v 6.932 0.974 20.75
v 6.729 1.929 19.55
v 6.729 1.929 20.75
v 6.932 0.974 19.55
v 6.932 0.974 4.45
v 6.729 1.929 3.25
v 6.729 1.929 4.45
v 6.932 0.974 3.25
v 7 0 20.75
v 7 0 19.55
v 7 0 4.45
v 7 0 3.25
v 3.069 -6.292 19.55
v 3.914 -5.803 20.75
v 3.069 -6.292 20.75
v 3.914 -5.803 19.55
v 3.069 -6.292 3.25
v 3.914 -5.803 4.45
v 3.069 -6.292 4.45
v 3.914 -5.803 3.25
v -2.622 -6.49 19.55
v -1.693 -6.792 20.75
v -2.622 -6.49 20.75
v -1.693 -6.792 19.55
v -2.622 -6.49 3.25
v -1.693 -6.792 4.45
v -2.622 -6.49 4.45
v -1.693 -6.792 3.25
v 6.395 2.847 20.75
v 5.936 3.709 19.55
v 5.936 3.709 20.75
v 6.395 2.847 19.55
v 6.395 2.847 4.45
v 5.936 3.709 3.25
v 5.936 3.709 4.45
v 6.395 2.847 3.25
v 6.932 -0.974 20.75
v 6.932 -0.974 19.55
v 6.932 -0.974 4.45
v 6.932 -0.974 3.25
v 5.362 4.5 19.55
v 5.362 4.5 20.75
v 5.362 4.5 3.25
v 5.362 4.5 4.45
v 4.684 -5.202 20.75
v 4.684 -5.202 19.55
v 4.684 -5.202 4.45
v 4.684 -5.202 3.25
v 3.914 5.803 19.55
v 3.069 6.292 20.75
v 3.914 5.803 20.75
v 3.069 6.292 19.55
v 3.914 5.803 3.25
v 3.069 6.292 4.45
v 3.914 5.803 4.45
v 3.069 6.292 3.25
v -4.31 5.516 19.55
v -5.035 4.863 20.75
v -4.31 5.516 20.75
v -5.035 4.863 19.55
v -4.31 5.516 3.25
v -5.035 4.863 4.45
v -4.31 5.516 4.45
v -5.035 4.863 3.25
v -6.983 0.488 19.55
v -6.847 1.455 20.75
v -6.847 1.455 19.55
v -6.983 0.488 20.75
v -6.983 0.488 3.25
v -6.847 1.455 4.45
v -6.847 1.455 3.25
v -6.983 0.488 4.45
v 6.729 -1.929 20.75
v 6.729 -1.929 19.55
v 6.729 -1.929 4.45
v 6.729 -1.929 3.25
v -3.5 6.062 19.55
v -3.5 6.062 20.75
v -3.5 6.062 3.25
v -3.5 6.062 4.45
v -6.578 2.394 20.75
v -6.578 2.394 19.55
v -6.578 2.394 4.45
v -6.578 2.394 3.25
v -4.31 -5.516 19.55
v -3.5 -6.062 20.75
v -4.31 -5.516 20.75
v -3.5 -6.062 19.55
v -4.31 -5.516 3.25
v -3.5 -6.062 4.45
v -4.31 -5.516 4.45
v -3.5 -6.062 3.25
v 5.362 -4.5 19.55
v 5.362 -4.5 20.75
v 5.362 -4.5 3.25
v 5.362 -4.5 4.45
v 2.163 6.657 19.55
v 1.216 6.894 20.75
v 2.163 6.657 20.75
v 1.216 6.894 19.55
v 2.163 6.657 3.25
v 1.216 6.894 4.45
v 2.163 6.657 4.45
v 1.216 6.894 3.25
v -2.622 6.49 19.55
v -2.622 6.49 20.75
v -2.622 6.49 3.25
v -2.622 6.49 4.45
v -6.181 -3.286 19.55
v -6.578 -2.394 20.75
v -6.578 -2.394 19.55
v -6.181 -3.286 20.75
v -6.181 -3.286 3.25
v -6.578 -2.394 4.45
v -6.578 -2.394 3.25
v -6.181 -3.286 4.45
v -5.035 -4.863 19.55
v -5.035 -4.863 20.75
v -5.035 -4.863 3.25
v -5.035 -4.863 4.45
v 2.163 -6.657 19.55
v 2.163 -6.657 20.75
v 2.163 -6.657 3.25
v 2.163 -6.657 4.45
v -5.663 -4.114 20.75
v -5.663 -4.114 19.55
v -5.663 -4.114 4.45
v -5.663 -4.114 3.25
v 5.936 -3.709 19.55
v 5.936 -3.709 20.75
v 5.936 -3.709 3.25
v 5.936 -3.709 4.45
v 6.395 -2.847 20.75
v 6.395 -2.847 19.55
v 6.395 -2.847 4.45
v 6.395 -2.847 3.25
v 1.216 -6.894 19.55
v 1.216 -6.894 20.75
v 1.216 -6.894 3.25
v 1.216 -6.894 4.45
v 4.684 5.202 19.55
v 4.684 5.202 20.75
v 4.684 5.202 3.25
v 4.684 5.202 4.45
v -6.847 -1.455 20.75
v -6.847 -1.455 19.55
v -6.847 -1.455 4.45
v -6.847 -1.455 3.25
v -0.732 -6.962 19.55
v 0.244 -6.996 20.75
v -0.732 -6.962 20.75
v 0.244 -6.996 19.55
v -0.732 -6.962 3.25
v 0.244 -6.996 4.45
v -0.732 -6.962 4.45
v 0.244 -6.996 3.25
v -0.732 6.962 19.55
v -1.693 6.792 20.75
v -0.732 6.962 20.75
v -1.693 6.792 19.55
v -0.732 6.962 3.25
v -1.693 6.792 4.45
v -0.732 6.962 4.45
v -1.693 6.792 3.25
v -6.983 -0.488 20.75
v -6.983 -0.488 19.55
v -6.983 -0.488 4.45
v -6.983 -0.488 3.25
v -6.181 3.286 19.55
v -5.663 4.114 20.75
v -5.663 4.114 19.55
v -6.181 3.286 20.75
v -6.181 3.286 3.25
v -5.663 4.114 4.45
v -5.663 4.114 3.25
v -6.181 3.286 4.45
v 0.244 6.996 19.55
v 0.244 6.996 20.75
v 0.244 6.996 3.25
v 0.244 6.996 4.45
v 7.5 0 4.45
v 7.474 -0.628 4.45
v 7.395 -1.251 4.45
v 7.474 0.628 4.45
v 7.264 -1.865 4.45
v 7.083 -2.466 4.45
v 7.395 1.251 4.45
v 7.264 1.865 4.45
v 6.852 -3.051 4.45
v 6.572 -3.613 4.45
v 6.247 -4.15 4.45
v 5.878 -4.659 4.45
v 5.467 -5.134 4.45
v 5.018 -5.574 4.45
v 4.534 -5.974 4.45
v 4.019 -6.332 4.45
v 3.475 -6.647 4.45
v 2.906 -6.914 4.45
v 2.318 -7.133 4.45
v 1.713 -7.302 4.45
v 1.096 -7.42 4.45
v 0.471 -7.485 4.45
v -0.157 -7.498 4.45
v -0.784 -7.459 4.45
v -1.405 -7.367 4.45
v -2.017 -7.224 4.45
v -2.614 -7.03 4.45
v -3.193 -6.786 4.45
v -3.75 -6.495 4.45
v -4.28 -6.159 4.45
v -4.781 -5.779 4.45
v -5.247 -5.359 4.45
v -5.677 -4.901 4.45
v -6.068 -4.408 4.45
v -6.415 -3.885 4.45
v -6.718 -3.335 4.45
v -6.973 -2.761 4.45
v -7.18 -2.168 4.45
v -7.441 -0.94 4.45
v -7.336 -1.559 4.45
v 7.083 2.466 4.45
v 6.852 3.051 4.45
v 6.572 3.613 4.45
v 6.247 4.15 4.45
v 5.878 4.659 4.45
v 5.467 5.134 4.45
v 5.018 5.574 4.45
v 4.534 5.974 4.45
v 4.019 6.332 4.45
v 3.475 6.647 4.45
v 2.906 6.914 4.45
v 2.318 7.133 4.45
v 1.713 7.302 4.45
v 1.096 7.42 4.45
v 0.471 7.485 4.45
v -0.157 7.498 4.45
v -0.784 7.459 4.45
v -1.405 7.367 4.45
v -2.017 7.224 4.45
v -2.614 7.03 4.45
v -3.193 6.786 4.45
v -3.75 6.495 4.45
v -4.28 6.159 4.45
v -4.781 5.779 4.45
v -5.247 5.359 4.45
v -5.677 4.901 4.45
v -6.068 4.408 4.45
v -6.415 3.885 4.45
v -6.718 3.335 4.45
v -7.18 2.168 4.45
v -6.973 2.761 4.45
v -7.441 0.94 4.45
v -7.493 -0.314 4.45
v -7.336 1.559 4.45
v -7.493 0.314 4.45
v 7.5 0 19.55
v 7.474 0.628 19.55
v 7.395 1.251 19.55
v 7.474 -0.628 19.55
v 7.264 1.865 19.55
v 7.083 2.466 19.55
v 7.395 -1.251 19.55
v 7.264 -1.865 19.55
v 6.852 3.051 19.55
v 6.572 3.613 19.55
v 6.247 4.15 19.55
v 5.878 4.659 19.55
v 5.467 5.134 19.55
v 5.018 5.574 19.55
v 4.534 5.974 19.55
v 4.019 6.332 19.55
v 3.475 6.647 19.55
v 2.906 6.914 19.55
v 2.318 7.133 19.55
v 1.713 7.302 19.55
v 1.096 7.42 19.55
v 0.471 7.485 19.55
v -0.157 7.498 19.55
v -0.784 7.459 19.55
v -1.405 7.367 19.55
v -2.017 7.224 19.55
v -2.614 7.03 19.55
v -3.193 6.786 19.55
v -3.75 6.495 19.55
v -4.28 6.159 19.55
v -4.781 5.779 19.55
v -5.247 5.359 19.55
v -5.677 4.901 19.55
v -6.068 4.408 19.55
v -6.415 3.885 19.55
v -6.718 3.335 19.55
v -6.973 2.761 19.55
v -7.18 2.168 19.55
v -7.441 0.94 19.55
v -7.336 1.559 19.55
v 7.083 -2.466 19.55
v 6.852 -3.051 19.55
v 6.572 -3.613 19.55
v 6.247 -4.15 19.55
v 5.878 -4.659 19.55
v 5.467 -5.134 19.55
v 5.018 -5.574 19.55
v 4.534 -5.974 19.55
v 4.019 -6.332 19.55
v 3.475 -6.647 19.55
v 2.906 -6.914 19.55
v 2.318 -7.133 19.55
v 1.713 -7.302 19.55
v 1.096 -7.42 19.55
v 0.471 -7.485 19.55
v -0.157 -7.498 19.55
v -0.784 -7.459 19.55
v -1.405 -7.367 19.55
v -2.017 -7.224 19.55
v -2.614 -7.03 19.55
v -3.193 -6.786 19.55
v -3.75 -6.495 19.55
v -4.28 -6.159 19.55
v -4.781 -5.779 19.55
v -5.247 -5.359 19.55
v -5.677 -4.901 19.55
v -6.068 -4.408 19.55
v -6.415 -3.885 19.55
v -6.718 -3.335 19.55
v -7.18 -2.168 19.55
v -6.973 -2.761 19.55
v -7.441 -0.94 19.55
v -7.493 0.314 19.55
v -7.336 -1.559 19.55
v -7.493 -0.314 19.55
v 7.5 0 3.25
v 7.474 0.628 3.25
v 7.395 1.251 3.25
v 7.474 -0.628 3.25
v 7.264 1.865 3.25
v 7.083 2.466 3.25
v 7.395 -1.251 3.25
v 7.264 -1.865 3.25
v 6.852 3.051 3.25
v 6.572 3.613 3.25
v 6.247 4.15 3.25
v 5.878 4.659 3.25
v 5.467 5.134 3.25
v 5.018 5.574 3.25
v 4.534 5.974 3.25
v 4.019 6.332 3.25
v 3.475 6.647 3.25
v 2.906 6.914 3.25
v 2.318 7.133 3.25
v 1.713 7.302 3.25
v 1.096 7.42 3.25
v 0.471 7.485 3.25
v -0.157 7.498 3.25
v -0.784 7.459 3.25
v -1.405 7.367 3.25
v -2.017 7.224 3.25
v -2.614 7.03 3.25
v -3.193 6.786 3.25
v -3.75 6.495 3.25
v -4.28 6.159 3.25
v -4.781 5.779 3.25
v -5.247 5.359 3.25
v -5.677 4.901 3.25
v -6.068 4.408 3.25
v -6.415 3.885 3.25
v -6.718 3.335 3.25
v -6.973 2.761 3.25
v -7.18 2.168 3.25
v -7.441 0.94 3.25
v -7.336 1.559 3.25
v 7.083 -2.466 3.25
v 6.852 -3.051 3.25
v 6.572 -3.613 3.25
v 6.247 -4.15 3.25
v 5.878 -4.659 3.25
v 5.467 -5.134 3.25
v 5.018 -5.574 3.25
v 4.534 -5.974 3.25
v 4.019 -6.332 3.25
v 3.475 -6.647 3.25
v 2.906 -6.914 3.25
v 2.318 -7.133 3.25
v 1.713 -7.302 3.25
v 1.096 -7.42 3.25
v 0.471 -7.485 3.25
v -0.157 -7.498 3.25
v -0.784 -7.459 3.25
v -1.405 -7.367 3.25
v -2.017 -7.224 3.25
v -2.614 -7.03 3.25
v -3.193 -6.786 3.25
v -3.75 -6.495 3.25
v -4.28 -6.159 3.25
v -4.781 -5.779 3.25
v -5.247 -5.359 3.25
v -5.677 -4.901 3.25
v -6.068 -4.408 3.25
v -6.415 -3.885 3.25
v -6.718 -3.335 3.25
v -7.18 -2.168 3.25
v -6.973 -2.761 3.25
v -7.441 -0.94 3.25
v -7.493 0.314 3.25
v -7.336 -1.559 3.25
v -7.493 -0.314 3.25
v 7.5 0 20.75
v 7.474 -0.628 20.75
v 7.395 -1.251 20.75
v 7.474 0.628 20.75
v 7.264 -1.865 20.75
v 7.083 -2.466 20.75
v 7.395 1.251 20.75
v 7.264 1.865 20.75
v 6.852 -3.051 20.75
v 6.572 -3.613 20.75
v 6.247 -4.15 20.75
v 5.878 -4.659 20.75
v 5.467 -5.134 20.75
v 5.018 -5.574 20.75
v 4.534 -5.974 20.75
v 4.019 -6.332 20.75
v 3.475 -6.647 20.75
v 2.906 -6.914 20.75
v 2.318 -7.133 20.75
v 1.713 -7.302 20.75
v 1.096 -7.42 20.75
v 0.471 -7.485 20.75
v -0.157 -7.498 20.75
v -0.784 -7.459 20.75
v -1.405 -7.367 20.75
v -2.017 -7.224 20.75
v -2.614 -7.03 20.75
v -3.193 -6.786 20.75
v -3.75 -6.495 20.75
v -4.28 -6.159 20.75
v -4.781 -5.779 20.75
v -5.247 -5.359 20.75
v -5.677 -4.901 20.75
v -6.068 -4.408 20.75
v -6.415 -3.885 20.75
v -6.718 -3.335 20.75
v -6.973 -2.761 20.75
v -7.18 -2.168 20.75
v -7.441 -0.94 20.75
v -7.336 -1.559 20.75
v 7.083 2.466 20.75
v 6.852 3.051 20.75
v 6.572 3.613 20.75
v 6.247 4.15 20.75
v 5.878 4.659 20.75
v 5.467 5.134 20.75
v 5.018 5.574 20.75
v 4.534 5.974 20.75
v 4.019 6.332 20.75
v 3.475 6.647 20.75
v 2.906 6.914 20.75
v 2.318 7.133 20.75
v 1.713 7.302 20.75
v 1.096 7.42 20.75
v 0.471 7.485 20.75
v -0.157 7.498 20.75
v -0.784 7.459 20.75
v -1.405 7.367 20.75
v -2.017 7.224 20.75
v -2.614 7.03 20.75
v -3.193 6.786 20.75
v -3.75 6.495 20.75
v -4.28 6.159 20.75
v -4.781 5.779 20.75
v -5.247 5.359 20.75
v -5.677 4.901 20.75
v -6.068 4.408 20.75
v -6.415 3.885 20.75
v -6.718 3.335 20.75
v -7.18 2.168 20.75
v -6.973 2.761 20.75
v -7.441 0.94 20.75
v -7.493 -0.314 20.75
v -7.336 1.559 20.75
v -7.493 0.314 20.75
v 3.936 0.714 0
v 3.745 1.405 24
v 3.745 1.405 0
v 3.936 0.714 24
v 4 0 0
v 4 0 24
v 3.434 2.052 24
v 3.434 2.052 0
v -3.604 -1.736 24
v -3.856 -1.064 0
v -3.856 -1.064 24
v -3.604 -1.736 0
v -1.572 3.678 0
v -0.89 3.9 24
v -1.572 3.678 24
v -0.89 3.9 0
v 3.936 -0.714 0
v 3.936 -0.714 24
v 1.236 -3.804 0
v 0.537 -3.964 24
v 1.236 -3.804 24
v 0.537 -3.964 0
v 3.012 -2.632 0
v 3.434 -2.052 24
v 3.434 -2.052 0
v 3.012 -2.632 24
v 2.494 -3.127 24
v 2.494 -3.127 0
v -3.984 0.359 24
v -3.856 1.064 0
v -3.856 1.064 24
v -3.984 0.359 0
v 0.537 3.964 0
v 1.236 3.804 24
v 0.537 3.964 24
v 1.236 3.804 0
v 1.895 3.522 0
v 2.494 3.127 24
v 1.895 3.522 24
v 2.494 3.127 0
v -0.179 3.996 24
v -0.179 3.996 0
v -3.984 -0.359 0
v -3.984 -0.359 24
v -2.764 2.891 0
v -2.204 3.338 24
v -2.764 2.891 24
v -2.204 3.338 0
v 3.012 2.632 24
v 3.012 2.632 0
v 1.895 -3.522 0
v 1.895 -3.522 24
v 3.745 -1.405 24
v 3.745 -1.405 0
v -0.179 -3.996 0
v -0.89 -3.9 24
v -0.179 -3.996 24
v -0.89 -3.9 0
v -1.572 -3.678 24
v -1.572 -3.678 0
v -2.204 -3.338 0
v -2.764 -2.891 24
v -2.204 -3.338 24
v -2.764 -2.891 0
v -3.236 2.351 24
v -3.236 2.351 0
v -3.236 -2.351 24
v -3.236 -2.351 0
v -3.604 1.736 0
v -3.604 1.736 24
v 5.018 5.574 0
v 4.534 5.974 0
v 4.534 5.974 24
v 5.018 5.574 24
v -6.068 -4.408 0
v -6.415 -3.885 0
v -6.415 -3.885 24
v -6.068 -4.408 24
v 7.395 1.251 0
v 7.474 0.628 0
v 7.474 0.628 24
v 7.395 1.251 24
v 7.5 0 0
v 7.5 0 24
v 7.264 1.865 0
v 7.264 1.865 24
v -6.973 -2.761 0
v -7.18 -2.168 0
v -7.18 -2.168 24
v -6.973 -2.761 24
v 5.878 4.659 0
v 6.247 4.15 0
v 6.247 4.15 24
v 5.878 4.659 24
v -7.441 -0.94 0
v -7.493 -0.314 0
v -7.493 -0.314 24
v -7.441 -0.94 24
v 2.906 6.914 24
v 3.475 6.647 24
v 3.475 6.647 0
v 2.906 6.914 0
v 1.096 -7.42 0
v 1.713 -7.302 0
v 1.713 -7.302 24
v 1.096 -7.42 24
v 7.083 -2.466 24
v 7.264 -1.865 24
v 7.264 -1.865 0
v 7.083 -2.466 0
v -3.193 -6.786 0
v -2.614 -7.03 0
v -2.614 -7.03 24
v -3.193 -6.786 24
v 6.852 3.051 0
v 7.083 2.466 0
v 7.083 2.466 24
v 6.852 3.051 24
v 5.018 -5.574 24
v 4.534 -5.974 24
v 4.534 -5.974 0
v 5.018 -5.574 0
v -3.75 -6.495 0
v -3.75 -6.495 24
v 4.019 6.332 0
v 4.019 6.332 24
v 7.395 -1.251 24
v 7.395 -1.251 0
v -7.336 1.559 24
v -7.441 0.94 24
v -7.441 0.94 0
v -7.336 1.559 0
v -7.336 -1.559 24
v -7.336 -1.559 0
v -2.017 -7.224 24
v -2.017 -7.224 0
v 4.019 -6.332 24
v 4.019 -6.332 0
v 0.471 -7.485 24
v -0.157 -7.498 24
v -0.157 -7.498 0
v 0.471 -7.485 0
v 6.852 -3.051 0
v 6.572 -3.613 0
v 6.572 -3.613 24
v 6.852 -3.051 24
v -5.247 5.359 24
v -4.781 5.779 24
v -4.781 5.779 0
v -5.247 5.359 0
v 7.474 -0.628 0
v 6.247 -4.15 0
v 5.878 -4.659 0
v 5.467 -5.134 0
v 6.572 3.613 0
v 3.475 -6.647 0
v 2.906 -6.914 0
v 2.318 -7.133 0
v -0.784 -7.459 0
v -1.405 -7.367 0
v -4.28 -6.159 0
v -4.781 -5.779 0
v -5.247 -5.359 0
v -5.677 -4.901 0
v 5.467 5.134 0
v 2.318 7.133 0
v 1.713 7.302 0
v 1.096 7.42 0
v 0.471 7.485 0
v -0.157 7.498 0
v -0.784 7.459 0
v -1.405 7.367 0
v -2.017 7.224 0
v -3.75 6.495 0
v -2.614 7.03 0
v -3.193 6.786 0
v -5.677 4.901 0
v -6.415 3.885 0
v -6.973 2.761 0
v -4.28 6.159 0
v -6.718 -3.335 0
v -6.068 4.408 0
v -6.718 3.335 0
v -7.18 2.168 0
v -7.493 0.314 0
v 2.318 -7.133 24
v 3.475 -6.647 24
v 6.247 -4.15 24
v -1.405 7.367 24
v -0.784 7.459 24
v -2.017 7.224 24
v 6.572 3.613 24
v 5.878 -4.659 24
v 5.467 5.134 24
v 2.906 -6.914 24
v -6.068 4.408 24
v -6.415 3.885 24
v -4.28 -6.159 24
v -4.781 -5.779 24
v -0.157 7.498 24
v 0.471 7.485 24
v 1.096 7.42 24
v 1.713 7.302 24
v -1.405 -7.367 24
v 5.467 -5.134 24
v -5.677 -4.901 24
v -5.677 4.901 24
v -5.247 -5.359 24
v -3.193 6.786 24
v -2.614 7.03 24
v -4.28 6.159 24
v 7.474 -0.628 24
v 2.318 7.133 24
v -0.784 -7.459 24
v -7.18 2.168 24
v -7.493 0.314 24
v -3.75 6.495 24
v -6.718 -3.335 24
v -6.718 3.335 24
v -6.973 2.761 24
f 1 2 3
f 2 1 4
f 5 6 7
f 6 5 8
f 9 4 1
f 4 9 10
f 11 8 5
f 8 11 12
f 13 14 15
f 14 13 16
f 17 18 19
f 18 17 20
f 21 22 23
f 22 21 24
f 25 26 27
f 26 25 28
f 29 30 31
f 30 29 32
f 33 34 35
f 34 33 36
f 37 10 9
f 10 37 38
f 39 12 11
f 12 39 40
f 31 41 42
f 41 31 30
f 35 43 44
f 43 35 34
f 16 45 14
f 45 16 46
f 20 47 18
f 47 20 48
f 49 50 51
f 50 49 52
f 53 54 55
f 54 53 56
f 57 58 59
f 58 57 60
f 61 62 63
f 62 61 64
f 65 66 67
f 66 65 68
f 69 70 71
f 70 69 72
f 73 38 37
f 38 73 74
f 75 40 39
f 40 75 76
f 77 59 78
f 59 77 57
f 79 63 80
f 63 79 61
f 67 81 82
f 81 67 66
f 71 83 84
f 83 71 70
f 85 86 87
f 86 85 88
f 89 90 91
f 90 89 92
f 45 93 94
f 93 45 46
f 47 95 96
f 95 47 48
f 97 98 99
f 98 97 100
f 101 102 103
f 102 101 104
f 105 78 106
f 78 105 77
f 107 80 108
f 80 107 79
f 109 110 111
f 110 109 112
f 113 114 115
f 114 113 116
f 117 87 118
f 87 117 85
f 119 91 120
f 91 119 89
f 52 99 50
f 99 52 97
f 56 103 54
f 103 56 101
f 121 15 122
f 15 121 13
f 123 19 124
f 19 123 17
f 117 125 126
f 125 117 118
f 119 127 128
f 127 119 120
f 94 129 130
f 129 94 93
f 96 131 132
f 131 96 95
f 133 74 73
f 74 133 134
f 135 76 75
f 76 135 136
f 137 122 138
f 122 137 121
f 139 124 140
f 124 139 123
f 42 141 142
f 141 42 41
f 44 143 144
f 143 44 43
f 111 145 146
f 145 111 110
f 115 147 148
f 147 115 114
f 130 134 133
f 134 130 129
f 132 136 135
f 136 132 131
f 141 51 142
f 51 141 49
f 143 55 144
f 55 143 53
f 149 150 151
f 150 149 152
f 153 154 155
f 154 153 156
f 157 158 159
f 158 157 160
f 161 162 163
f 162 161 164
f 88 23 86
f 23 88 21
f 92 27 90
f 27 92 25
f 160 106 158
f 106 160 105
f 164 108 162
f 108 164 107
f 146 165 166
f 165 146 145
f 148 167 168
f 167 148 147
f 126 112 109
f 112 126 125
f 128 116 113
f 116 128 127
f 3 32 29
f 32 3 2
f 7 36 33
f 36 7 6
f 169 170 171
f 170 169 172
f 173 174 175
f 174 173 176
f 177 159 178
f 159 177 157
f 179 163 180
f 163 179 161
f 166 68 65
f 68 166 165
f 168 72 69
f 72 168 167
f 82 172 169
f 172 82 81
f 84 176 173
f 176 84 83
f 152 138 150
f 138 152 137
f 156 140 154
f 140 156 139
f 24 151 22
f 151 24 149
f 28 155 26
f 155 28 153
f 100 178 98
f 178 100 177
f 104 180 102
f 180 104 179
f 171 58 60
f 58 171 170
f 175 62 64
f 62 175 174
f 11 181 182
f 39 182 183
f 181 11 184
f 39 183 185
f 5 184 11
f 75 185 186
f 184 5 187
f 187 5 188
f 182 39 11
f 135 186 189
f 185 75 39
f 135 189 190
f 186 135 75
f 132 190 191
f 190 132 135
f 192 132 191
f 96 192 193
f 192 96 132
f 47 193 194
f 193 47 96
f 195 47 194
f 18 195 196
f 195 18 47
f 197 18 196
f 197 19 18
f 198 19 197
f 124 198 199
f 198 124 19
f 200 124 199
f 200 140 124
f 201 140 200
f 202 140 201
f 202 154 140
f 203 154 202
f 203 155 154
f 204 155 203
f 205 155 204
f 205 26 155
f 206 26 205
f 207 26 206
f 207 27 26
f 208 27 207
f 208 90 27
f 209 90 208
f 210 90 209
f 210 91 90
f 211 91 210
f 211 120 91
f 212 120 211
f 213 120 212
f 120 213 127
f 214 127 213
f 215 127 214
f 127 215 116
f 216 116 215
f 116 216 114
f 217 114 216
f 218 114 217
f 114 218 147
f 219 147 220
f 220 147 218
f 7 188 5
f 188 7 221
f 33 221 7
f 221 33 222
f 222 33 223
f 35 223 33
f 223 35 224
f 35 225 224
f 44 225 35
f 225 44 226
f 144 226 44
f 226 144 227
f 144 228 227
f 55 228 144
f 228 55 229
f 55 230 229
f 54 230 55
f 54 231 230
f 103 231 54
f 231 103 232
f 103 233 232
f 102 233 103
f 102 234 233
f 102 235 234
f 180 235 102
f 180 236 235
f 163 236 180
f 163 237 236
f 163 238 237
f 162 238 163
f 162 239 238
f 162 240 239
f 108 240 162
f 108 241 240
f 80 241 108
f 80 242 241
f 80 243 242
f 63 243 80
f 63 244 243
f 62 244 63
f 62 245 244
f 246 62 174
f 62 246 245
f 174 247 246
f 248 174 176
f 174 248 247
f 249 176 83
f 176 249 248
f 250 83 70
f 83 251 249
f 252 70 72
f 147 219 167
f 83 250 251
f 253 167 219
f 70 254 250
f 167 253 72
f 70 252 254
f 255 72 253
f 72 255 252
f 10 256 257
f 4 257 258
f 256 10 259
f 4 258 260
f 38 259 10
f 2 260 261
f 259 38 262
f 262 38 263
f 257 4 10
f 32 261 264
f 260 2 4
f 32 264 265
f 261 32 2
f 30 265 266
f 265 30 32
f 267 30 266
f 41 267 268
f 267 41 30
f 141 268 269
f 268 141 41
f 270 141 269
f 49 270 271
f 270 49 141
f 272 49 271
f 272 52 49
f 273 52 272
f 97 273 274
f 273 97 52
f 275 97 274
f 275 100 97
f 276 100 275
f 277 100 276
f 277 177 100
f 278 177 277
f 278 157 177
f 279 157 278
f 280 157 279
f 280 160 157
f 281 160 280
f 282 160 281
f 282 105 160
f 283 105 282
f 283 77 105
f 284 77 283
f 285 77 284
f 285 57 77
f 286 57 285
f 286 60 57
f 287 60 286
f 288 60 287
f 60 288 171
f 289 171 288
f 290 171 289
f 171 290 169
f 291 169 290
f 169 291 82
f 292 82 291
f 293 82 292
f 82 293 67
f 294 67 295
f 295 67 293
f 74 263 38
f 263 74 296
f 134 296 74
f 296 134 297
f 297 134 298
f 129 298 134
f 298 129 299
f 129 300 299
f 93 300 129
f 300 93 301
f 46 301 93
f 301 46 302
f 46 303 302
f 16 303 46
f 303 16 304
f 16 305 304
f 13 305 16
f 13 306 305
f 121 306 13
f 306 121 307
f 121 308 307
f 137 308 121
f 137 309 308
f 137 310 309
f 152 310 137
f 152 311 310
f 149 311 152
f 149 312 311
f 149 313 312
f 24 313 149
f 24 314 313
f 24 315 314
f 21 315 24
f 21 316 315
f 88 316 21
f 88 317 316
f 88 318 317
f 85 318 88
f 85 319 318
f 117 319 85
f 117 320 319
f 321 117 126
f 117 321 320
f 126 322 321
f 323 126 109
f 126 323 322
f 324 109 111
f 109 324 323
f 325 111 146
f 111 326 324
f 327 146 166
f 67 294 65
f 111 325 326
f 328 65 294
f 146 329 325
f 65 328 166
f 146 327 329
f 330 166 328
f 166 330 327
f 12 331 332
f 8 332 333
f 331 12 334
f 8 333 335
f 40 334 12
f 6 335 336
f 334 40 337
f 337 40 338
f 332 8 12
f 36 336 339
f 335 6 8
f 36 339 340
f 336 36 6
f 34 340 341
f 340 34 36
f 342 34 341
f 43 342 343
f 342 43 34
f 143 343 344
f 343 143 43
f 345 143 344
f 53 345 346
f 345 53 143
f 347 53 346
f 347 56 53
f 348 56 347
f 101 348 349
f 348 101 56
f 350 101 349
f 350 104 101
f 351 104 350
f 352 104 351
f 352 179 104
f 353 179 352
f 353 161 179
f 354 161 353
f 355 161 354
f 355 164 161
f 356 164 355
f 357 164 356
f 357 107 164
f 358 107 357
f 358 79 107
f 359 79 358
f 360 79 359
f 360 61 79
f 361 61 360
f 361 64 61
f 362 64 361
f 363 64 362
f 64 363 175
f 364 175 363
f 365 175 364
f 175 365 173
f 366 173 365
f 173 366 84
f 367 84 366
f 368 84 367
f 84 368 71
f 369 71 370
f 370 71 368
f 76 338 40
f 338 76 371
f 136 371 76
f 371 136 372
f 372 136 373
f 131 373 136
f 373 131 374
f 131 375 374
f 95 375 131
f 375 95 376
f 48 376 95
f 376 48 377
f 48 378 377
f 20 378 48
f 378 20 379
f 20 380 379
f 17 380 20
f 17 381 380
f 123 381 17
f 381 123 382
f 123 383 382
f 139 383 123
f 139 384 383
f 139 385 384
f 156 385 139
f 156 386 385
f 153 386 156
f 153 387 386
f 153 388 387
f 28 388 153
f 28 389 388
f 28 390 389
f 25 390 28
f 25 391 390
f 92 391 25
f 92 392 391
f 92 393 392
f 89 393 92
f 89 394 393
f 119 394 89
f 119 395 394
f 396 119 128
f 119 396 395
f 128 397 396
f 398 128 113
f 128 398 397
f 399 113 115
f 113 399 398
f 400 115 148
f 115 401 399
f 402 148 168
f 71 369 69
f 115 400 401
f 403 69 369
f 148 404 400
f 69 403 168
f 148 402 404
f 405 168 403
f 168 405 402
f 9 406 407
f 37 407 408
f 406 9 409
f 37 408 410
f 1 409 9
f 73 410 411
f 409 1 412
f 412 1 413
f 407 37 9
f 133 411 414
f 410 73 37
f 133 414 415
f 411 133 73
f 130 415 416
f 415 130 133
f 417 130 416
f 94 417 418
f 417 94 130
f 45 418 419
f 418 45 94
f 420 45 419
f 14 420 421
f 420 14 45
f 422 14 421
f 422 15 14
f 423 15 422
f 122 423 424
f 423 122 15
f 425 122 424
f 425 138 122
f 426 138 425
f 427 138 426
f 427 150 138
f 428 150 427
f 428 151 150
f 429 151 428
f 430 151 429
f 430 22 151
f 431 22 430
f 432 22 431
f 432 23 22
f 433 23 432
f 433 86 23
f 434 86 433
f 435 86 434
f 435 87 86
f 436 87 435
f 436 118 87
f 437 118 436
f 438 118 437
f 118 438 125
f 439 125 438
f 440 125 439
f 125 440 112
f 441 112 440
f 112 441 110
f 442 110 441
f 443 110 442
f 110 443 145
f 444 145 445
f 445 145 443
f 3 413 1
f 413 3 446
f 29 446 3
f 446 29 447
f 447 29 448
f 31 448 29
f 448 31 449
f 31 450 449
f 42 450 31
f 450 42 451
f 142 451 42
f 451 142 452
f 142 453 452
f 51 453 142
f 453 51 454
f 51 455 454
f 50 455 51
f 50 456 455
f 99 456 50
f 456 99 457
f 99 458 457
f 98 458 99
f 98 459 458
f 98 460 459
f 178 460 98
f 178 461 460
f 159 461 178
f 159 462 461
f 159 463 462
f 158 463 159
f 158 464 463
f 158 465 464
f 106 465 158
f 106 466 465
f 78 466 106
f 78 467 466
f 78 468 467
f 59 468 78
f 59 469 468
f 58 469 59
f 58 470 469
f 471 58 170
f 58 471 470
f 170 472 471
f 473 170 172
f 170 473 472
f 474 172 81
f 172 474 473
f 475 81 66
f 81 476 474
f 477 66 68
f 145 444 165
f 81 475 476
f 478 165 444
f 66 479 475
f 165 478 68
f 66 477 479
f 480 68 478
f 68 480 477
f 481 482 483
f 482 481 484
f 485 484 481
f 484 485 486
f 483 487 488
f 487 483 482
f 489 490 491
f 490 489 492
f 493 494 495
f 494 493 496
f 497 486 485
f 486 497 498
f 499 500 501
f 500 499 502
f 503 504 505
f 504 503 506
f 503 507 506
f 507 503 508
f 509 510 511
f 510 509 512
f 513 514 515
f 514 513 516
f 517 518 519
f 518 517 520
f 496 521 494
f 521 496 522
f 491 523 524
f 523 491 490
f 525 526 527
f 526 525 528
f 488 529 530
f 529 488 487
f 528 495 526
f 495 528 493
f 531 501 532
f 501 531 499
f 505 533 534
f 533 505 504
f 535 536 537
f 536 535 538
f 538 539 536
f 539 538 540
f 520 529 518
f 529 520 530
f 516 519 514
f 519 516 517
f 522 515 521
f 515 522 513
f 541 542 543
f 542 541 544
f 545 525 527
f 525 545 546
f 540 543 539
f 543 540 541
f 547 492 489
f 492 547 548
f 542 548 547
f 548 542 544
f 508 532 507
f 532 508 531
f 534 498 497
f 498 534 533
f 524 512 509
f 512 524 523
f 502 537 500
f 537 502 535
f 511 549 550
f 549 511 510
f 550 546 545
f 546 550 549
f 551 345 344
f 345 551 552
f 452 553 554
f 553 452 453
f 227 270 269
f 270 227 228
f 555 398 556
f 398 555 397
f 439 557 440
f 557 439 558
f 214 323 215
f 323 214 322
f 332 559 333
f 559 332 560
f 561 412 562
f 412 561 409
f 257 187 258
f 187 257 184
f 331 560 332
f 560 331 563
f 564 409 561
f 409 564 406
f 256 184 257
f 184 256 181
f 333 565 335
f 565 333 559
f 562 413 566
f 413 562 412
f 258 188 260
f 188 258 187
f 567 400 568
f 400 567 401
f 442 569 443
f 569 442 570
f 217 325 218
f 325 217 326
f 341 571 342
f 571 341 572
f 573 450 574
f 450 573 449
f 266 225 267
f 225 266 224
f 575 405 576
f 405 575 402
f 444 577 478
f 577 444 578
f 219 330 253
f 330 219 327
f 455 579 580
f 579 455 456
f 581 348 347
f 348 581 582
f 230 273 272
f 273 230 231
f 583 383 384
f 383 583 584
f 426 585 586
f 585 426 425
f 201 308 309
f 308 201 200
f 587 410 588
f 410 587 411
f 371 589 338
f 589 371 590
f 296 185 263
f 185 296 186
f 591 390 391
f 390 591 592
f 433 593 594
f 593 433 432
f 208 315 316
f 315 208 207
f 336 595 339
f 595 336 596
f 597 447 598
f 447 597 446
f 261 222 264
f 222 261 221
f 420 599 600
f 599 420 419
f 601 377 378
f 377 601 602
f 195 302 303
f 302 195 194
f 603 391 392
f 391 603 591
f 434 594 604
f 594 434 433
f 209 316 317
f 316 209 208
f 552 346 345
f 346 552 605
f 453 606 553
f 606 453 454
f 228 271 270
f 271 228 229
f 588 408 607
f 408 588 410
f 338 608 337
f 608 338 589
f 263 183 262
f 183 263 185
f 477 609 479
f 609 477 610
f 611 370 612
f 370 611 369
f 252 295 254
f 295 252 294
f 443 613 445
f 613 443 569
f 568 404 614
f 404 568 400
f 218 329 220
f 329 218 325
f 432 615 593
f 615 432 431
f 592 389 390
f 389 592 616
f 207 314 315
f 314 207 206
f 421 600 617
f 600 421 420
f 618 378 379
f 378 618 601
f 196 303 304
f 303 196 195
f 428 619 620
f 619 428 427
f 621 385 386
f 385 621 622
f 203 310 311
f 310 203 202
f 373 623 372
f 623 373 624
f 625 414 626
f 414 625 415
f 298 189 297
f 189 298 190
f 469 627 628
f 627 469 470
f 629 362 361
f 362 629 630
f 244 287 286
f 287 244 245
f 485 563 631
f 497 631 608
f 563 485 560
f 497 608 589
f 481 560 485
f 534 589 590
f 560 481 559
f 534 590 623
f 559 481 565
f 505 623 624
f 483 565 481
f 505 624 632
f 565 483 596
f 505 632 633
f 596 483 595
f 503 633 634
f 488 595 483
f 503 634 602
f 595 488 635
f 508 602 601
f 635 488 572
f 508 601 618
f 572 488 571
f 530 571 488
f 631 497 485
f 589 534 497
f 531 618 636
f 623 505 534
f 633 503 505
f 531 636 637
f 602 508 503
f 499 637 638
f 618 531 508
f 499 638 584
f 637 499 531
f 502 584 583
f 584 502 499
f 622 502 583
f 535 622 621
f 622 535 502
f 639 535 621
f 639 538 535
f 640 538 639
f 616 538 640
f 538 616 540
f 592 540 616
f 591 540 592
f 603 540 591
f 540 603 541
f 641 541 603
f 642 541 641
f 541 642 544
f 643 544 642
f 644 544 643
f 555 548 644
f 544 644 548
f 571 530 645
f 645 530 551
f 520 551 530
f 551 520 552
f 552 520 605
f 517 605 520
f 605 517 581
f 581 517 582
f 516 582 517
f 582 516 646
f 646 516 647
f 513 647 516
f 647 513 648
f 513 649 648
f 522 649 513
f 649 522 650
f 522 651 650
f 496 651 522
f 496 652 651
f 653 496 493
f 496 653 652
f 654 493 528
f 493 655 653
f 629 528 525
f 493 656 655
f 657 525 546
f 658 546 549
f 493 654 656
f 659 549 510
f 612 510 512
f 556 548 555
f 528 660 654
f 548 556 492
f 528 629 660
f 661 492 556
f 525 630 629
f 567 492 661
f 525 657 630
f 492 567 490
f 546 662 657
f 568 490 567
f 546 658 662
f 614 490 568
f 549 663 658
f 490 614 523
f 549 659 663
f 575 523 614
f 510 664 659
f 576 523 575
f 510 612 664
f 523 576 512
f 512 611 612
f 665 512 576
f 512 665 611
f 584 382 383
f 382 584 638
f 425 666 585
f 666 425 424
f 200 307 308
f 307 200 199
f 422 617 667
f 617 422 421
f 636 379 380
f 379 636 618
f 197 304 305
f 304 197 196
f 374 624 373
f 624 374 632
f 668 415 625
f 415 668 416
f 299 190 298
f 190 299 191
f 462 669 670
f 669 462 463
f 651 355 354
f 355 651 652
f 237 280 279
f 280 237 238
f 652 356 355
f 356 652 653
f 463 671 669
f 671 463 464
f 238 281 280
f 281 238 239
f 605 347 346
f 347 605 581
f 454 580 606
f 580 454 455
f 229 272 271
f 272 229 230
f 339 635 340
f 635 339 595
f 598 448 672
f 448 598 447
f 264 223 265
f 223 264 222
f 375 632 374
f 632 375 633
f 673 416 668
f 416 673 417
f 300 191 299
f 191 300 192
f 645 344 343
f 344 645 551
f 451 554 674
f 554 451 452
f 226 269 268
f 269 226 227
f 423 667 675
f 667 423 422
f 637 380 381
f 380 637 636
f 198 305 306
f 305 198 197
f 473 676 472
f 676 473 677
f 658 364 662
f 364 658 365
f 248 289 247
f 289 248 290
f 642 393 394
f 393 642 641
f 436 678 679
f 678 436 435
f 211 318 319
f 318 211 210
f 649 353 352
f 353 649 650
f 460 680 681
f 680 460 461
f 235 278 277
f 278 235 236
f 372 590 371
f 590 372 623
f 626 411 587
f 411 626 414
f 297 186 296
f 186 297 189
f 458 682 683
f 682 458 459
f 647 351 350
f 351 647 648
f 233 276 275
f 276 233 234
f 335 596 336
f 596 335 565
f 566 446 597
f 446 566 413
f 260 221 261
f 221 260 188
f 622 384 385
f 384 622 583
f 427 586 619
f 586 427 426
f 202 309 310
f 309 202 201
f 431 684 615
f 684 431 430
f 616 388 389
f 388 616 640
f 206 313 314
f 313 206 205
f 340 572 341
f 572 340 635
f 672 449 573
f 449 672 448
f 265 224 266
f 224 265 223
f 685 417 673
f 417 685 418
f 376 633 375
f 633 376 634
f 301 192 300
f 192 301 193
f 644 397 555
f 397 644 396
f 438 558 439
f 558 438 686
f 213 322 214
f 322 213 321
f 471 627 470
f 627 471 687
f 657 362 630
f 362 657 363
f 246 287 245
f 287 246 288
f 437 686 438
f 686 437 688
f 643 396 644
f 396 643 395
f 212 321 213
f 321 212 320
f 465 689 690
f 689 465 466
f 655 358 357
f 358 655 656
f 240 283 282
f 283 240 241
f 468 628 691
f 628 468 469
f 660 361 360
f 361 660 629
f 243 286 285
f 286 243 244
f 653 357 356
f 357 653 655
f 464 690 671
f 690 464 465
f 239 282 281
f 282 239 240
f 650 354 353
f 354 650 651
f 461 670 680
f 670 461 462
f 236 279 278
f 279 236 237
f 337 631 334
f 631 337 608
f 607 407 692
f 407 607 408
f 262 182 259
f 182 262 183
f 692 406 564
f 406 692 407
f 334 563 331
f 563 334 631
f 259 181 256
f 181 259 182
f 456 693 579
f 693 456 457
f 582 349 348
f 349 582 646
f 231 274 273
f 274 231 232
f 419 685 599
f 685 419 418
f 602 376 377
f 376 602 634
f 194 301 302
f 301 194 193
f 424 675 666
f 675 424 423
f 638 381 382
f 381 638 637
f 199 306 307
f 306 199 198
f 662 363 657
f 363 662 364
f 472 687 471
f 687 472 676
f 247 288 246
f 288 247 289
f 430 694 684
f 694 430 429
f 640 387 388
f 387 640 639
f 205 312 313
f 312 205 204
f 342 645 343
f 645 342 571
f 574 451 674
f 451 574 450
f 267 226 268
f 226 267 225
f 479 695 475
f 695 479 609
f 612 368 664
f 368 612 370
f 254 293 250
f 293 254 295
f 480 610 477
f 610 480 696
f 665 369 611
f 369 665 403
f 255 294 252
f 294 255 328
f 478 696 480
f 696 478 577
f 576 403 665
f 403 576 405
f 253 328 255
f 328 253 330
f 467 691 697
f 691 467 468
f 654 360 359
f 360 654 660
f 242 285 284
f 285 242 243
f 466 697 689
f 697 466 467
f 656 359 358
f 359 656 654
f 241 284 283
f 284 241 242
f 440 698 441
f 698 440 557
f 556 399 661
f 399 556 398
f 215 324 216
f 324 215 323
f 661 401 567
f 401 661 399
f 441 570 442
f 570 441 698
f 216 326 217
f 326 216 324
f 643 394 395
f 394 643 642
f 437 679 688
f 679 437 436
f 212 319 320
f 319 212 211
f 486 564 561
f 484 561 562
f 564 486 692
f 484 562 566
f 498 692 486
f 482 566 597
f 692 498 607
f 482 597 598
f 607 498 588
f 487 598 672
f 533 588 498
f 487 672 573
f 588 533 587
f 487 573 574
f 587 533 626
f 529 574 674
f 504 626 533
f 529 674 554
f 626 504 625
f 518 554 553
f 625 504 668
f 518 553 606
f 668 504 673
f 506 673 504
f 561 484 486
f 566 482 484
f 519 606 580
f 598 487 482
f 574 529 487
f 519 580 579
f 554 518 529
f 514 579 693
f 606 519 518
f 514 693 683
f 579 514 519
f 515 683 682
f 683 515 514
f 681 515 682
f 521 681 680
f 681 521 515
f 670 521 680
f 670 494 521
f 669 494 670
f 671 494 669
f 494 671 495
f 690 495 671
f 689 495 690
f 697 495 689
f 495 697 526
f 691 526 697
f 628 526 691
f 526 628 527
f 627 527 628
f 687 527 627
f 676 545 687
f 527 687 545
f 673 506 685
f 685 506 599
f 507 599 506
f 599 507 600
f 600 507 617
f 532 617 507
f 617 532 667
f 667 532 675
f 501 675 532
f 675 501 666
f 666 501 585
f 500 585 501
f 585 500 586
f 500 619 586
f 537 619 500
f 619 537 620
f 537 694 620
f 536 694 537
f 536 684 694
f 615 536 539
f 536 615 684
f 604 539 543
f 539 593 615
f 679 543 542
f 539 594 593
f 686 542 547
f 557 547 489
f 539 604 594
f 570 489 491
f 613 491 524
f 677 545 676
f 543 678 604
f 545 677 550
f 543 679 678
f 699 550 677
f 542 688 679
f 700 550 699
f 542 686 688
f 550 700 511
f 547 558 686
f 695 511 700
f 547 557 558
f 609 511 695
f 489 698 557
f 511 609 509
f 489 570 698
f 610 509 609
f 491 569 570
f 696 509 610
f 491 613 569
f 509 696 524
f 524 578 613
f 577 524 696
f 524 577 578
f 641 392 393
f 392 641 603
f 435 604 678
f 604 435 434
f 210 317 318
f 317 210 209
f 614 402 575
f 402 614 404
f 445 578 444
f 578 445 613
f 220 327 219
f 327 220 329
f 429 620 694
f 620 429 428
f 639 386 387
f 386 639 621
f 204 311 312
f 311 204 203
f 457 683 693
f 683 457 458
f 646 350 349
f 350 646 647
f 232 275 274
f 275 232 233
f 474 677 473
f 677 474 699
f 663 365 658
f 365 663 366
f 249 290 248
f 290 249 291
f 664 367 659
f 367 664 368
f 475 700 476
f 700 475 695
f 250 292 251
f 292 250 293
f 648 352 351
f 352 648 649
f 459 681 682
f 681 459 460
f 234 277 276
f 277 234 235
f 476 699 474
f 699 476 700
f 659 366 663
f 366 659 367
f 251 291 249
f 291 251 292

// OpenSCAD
// file: ../config.scad
//Display helpers
function only_show_printable() = false;
function enabled_materials_filter() = [
    "PLA",
    "PETG",
    "Nylon"
];

//Bearings
function LM8UU_Pressure_Fit_Extra_Diameter() = 0.3;

//Smooth rods
function Rod_Pressure_Fit_Extra_Diameter() = 0.5;

//X Axis
function X_Axis_Rod_Separation() = 34;                          // Distance between rods
function X_Axis_Carriage_Rod_Vertical_Space() = 4;              // Distance between rods and the bearings they rest on
function X_Axis_Carriage_Mid_Bearing_Surround() = 3;            // Amount of plastic around the bearing (in the mid part of the carriage)
function X_Axis_Carriage_Rod_Surround_Extra_Diameter() = 12;    //Amount of plastic around the rods attaching them to the carriage
function X_Axis_Carriage_Screw_Guide_Diameter() = 10;
function X_Axis_Carriage_Screw_Hole_Diameter() = 3.7;
function X_Axis_Carriage_Screw_Hole_Z_Offset() = 2.5;
function X_Axis_Carriage_Bottom_Screw_Hole_Z_Offset() = -1;
function X_Axis_Carriage_Bottom_Screw_Hole_X_Offset() = 4;
function X_Axis_Carriage_Idler_Extra_Diameter() = 2;            //Extra space to put around the idlers
function X_Axis_Carriage_Idler_Extra_Height() = 1;              //Extra space to put above and below idlers
function X_Axis_Carriage_Idler_Vertical_Separation() = 0.5;     //Vertical space between the two idlers
function X_Axis_Carriage_Inner_Extra_Height() = 4;
function X_Axis_Belt_Hole_Extra_Clearance() = 3;

//Y Axis


//Carriage
function Carriage_Bearing_Separation() = 1;                     // Distance between bearings on the carriage (along rods)
function Carriage_Clamp_Reduce_Length() = 1;                    // How much shorter is the hotend clamp than the length of the carriage
function Carriage_Clamp_Hotend_Fix_Extra_Diameter() = 0.1;      // How much extra diameter to allow inside the hotend clamp
function Carriage_Concealed_Nut_Head_Depth() = 1.75;            // Depth of the hole for the bolt head/nut concealed beneath the carriage bearings

function Hotend_Retainer_Extra_Diameter() = 2.5;       // Diameter of the retaining ring around the hotend mounting point
function Hotend_Retainer_Guide_Diameter() = 2;         // Diameter of the 4 guides on the hotend retainer
function Hotend_Retainer_Pressfit_Extra_Diameter() = 0.15;  //Extra diameter to allow for the pressure fit of the hotend retainer
// file: ../materials.scad
use <config.scad>;

module printed(material) {

    module if_enabled_material(enabled_materials, query, index) {
        if (enabled_materials[index] == query) {
            children();
        } else {
            if (index < len(enabled_materials)) {
                if_enabled_material(enabled_materials, query, index + 1) children();
            }
        }
    }

    if_enabled_material(enabled_materials_filter(), material, 0)
        children();
}
module not_printed() {
    if (!only_show_printable())
        children();
}

module metal(color = "silver") {
    not_printed() color(color) children();
}

module jitter_color(c) {
    amount = 0.065;
    d = [
        min(1, max(0, c[0] + rands(-amount,amount,1)[0])),
        min(1, max(0, c[1] + rands(-amount,amount,1)[0])),
        min(1, max(0, c[2] + rands(-amount,amount,1)[0]))
    ];
    color(d) children();
}

module brass() {
    not_printed() jitter_color([181 / 255, 166 / 255, 66 / 255]) children();
}

module PLA() {
    printed("PLA") color(color("cornflowerblue")) children();
}

module PETG() {
    printed("PETG") jitter_color([57 / 255, 255 / 255, 11 / 255, 1]) children();
}

module nylon() {
    printed("Nylon") jitter_color(color("grey")) children();
}
// main file
use <../materials.scad>

//24mm long x 15mm outer diameter x 8mm inner diameter
//2 grooves with 14.5mm outer diameter
//Grooves vary in width between 1mm and 1.25mm

function LM8UU_Length() = 24;
function LM8UU_Diameter() = 15;

module LM8UU() {
    not_printed() difference() {
        cylinder(d = LM8UU_Diameter(), LM8UU_Length(), $fn = 75);
        union() {
            translate([0, 0, -12]) cylinder(d = 8, 48, $fn = 35);
            difference() {
                translate([0, 0, 3.25]) cylinder(d = 20, 17.5);
                union() {
                    cylinder(d = 14, 24, $fn = 45);
                    translate([0, 0, (17.5 - 15.1) / 2 + 3.25]) cylinder(d = 48, 15.1);
                }
            }
        }
    }
}
LM8UU();
